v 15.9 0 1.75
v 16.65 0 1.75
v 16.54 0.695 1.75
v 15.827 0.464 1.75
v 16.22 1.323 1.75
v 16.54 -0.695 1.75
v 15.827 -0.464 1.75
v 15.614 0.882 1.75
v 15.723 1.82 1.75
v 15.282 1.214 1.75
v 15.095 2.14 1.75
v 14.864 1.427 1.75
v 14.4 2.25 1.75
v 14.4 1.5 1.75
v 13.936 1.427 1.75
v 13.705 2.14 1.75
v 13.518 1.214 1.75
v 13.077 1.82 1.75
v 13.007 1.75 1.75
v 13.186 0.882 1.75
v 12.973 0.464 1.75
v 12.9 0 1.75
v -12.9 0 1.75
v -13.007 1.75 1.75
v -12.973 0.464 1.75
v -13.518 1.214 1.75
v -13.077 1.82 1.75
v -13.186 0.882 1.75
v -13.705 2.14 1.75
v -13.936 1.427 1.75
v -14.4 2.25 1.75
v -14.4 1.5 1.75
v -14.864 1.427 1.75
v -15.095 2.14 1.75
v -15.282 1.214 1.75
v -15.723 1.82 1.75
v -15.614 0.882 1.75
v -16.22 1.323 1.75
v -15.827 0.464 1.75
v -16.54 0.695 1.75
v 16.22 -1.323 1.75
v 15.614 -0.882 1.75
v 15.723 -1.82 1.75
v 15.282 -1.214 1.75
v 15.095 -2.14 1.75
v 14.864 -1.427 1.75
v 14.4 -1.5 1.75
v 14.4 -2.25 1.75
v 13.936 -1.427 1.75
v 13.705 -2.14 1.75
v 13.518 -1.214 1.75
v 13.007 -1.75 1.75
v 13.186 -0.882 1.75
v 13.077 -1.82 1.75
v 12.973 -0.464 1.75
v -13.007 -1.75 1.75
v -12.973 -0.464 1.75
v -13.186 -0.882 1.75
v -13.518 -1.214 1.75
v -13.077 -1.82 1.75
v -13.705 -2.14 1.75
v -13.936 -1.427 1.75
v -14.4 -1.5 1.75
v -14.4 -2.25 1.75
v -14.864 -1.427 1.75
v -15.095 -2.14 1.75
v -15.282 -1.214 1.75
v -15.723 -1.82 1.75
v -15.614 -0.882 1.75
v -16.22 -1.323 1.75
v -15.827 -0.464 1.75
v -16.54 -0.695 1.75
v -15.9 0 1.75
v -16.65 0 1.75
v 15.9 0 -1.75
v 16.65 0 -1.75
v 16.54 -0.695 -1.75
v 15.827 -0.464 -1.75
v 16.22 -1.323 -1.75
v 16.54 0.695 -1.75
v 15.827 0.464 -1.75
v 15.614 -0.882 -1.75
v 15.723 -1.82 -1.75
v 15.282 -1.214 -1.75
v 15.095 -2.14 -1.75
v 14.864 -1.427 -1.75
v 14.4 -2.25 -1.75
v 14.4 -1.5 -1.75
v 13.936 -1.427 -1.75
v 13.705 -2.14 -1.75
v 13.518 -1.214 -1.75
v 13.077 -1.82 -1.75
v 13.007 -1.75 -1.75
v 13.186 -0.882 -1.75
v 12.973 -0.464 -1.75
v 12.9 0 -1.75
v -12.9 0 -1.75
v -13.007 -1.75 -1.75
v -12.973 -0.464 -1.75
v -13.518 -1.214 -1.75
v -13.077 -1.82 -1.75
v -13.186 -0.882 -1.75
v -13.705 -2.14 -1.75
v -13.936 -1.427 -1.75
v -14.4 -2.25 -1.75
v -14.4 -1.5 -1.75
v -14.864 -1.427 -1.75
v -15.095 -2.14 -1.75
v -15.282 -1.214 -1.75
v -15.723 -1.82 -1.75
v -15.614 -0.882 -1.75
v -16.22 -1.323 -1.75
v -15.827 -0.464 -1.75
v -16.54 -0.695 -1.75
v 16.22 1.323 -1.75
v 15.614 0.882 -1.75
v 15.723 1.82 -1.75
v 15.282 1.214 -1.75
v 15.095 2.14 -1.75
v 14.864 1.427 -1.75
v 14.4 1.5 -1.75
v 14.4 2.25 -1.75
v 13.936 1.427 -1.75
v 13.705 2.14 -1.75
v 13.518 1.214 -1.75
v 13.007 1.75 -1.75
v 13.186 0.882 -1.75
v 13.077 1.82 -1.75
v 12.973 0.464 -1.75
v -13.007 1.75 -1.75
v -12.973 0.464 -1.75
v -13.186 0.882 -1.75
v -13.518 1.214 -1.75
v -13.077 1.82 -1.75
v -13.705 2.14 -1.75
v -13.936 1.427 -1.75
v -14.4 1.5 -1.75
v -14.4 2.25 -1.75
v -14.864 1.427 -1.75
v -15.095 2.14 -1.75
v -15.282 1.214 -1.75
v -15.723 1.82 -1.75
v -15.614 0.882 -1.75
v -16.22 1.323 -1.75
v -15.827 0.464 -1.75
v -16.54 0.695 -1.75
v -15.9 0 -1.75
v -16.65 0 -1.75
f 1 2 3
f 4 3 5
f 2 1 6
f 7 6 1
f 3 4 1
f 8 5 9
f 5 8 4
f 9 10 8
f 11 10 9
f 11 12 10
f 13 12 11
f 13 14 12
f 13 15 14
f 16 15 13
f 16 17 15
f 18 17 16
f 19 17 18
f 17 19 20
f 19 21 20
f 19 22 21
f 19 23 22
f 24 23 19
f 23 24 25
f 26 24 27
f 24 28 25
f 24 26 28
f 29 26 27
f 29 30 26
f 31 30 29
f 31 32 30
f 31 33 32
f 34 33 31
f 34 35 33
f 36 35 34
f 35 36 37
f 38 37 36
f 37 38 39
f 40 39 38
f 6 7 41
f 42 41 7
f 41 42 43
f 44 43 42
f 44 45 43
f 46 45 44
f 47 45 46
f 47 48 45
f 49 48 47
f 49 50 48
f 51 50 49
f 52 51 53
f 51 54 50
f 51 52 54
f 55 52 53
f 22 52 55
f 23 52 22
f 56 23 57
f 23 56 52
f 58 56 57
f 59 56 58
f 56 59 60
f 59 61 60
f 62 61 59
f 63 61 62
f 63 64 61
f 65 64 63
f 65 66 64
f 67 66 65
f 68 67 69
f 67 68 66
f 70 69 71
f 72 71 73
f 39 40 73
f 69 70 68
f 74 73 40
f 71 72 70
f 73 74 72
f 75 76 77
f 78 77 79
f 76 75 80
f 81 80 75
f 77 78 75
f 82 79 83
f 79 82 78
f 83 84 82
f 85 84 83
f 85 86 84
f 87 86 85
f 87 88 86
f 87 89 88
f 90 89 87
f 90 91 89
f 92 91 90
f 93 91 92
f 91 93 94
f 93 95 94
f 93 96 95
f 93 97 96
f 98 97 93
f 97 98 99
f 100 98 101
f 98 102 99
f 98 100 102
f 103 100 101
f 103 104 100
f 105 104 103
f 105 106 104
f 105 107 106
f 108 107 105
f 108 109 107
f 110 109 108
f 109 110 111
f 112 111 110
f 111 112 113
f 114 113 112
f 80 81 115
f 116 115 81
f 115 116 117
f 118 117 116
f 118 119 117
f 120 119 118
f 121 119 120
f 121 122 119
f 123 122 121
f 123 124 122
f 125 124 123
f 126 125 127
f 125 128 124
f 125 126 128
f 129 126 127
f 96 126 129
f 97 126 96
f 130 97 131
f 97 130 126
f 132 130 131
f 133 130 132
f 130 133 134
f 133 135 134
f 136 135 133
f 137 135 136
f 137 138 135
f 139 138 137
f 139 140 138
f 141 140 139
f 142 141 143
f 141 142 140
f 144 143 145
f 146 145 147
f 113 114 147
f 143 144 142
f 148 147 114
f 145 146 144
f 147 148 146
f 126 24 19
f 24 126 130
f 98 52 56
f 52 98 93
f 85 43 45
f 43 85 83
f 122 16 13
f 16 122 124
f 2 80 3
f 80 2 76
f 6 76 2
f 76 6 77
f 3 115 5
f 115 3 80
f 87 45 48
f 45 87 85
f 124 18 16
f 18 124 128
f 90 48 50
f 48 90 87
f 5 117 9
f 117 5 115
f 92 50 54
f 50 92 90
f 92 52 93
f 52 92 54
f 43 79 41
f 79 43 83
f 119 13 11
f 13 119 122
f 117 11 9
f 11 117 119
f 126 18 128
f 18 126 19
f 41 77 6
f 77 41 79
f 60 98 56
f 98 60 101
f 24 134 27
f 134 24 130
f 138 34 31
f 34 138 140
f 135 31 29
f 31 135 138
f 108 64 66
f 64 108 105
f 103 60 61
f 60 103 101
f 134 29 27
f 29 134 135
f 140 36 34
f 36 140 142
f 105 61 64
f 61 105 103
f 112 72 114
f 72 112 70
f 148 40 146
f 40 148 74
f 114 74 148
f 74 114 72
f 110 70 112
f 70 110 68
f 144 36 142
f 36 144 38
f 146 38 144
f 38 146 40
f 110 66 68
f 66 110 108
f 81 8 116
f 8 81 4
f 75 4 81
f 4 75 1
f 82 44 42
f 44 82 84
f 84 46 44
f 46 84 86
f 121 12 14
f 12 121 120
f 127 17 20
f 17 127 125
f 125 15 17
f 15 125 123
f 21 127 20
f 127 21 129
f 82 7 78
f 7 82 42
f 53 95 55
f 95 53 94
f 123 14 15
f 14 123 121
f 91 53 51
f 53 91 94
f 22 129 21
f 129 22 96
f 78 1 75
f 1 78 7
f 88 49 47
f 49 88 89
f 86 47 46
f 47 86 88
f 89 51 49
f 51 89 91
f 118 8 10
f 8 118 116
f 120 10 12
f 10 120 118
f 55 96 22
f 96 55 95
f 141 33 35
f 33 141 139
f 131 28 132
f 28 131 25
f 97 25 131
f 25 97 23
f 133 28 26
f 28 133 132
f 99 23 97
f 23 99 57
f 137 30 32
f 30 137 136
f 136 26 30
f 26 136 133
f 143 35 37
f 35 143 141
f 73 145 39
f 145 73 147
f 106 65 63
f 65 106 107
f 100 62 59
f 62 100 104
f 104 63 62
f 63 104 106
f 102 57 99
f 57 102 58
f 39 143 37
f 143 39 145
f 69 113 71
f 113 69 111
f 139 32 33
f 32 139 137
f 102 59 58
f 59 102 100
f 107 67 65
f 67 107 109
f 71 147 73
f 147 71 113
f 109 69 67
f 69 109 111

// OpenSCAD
longueur_batterie=53;
largeur_batterie=34;
longueur_boite = 28;
epaisseur_batterie=5.5;
epaisseur=2;
epaisseur_ci=1.5;
longueur_ci_charge = 28;
largeur_ci_charge = 17;
largeur_usb=8;
hauteur_usb = 3;
longueur_ci_pwm = 30;
largeur_ci_pwm = 21;
longueur_ci_step_up = 37;
largeur_ci_step_up = 17.5;
epaisseur_ci_step_up = 6;
longueur_led = 18;
largeur_led = 15;
longueur_bloc_led = 23.6;
largeur_bloc_led = 22.8;
epaisseur_bloc_led = 14.5;
longueur_couvercle = epaisseur_bloc_led+epaisseur+1;
longeur_hotshoe = 17.5;
epaisseur_rad = 1.6;


module boite_bas(){
    difference(){
        cube([longueur_batterie+2*epaisseur, largeur_batterie+2*epaisseur, longueur_boite], center=true);
        translate([0,0,epaisseur])
        cube([longueur_batterie, largeur_batterie, longueur_boite], center=true);
        translate([(largeur_ci_charge-longueur_batterie)/2,0,epaisseur_batterie+epaisseur-longueur_boite/2])
        rotate([0,0,180])
        #charge_ci();
        translate([-(longueur_ci_pwm-longueur_batterie+0.5)/2,0,epaisseur_batterie+epaisseur_ci/2+epaisseur-longueur_boite/2])
        #pwm();
        translate([0,0,epaisseur_batterie+epaisseur-longueur_boite/2+epaisseur_ci_step_up/2+epaisseur_ci/2+12])
        #step_up();
        
        translate([0,5-largeur_batterie/2,4*epaisseur-longueur_boite/2])
        rotate([90,0,0])
        cylinder(d=3, h=10, $fn=20);
        translate([0,5-largeur_batterie/2,4*epaisseur-longueur_boite/2+longeur_hotshoe/2])
        rotate([90,0,0])
        cylinder(d=3, h=10, $fn=20);
        
        translate([longueur_batterie/4,largeur_batterie/2+epaisseur+1,(longueur_boite-(4+epaisseur))/2])
        rotate([90,0,0])
        #cylinder(d=4, h=largeur_batterie+10, $fn=20);
        translate([-longueur_batterie/4,largeur_batterie/2+epaisseur+1,(longueur_boite-(4+epaisseur))/2])
        rotate([90,0,0])
        #cylinder(d=4, h=largeur_batterie+10, $fn=20);
        translate([-longueur_batterie/2-epaisseur-1,0,(longueur_boite-(4+epaisseur))/2])
        rotate([0,90,0])
        #cylinder(d=4, h=longueur_batterie+10, $fn=20);
    }
}

module couvercle(){
    difference(){
        union(){
            difference(){
                cube([longueur_batterie+4*epaisseur, largeur_batterie+4*epaisseur, longueur_couvercle], center=true);
                translate([0,0,-2*epaisseur])
                cube([longueur_batterie+2*epaisseur, largeur_batterie+2*epaisseur, longueur_couvercle], center=true);
                translate([0,0,longueur_couvercle/2])
                cube([longueur_led,largeur_led,10], center=true);
            
                translate([longueur_batterie/4,largeur_batterie/2+2*epaisseur+1,-(longueur_couvercle-(2+epaisseur))/2])
                rotate([90,0,0])
                cylinder(d=3, h=largeur_batterie+10, $fn=20);
                translate([-longueur_batterie/4,largeur_batterie/2+2*epaisseur+1,-(longueur_couvercle-(2+epaisseur))/2])
                rotate([90,0,0])
                cylinder(d=3, h=largeur_batterie+10, $fn=20);
                translate([-longueur_batterie/2-2*epaisseur-1,0,-(longueur_couvercle-(2+epaisseur))/2])
                rotate([0,90,0])
                cylinder(d=3, h=longueur_batterie+4*epaisseur+2, $fn=20);
        
                translate([0,0,(longueur_couvercle-epaisseur-epaisseur_bloc_led-epaisseur)/2+epaisseur/2])
                rotate([180,0,90])
                #led();
            }
            translate([(6+largeur_bloc_led)/2,0,(longueur_couvercle-epaisseur-4-epaisseur)/2+epaisseur/2])
            #cube([6,longueur_bloc_led,4],center=true);
            translate([-(3+largeur_bloc_led/2),0,(longueur_couvercle-epaisseur-4-epaisseur)/2+epaisseur/2])
            #cube([6,longueur_bloc_led,4],center=true);
        }
        translate([(largeur_bloc_led+6)/2,(longueur_bloc_led-4)/2-epaisseur_rad,(epaisseur_bloc_led-4)/2])
        cylinder(d=4, h=4, $fn=20, center=true);
        translate([-(largeur_bloc_led+6)/2,(longueur_bloc_led-4)/2-epaisseur_rad,(epaisseur_bloc_led-4)/2])
        cylinder(d=4, h=4, $fn=20, center=true);
        translate([(largeur_bloc_led+6)/2,-(longueur_bloc_led-4)/2+epaisseur_rad,(epaisseur_bloc_led-4)/2])
        cylinder(d=4, h=4, $fn=20, center=true);
        translate([-(largeur_bloc_led+6)/2,-(longueur_bloc_led-4)/2+epaisseur_rad,(epaisseur_bloc_led-4)/2])
        cylinder(d=4, h=4, $fn=20, center=true);
        
        translate([-(longueur_batterie-epaisseur)/2,-(largeur_batterie-epaisseur)/2,(longueur_couvercle-6)/2])
        cylinder(d=4, h=6, $fn=20, center=true);
        translate([-(longueur_batterie-epaisseur)/2,(largeur_batterie-epaisseur)/2,(longueur_couvercle-6)/2])
        cylinder(d=4, h=6, $fn=20, center=true);
        translate([(longueur_batterie-epaisseur)/2,-(largeur_batterie-epaisseur)/2,(longueur_couvercle-6)/2])
        cylinder(d=4, h=6, $fn=20, center=true);
        translate([(longueur_batterie-epaisseur)/2,(largeur_batterie-epaisseur)/2,(longueur_couvercle-6)/2])
        cylinder(d=4, h=6, $fn=20, center=true);
    }
}

module hotshoe(){
    epaisseur_plateau = 1.8;
    epaisseur_sup = 5;
    translate([0,0,-(epaisseur_sup+epaisseur_plateau)])
    difference(){
    union(){
        translate([0,0,epaisseur_plateau/2])
        cube([18.5,longeur_hotshoe,epaisseur_plateau], center=true);
        translate([0,0,epaisseur_sup/2+epaisseur_plateau])
        cube([11.5,longeur_hotshoe,epaisseur_sup], center=true);
    }
        translate([0,(longeur_hotshoe-4)/2-1.5*epaisseur-longeur_hotshoe/2,epaisseur_sup+epaisseur_plateau-3])
        cylinder(d=4, h=10, $fn=20);
        translate([0,(longeur_hotshoe-4)/2-1.5*epaisseur,epaisseur_sup+epaisseur_plateau-3])
        cylinder(d=4, h=10, $fn=20);
    }
}

module charge_ci(){
    translate([0,0,epaisseur_ci/2])
    union(){
        cube([largeur_ci_charge,longueur_ci_charge,epaisseur_ci], center=true);
        translate([0,longueur_ci_charge/2,(epaisseur_ci+hauteur_usb)/2])
        cube([largeur_usb,20,hauteur_usb], center=true);
    }
}

module pwm(){
    union(){
        cube([longueur_ci_pwm,largeur_ci_pwm,epaisseur_ci], center=true);
        translate([(8-longueur_ci_pwm)/2,0,5])
        cube([8,largeur_ci_pwm,10], center=true);
        translate([-(12-longueur_ci_pwm)/2,0,6])
        cube([12,10,12], center=true);
        translate([longueur_ci_pwm/2,0,(epaisseur_ci+12)/2])
        rotate([0,90,0])
        cylinder(d=7, h=10, $fn=420);
    }
}

module step_up(){
    cube([longueur_ci_step_up,largeur_ci_step_up,epaisseur_ci_step_up], center=true);
}

module led(){
    vide_rad = 4;    
    difference(){
    cube([longueur_bloc_led, largeur_bloc_led, epaisseur_bloc_led], center=true);
        
    translate([(longueur_bloc_led-vide_rad)/2-epaisseur_rad,0,(epaisseur_bloc_led-10)/2])
    cube([vide_rad, largeur_bloc_led+1, 10],center=true);
    translate([epaisseur_rad-(longueur_bloc_led-vide_rad)/2,0,(epaisseur_bloc_led-10)/2])
    cube([vide_rad, largeur_bloc_led+1, 10],center=true);
    translate([(longueur_bloc_led-vide_rad)/2-vide_rad-2*epaisseur_rad,0,(epaisseur_bloc_led-10)/2])
    cube([vide_rad, largeur_bloc_led+1, 10],center=true);
    translate([vide_rad+2*epaisseur_rad-(longueur_bloc_led-vide_rad)/2,0,(epaisseur_bloc_led-10)/2])
    cube([vide_rad, largeur_bloc_led+1, 10],center=true);
    }
}

module barre(){
    difference(){
        union(){
        cube([largeur_bloc_led+6,3.5,3.5], center=true);
        translate([(largeur_bloc_led+6)/2,0,0])
        cylinder(d=4.5, h=3.50, $fn=20, center=true);
        translate([-(largeur_bloc_led+6)/2,0,0])
        cylinder(d=4.5, h=3.5, $fn=20, center=true);    
        }
        translate([(largeur_bloc_led+6)/2,0,0])
        cylinder(d=3, h=10, $fn=20, center=true);
        translate([-(largeur_bloc_led+6)/2,0,0])
        cylinder(d=3, h=10, $fn=20, center=true);
    }
}

//boite_bas();
//translate([0,0,longueur_couvercle/2])
//couvercle();

//translate([0,-(largeur_batterie/2+epaisseur),1.5*epaisseur+(17.5-longueur_boite)/2])
//rotate([-90,0,0])
//hotshoe();

barre();
